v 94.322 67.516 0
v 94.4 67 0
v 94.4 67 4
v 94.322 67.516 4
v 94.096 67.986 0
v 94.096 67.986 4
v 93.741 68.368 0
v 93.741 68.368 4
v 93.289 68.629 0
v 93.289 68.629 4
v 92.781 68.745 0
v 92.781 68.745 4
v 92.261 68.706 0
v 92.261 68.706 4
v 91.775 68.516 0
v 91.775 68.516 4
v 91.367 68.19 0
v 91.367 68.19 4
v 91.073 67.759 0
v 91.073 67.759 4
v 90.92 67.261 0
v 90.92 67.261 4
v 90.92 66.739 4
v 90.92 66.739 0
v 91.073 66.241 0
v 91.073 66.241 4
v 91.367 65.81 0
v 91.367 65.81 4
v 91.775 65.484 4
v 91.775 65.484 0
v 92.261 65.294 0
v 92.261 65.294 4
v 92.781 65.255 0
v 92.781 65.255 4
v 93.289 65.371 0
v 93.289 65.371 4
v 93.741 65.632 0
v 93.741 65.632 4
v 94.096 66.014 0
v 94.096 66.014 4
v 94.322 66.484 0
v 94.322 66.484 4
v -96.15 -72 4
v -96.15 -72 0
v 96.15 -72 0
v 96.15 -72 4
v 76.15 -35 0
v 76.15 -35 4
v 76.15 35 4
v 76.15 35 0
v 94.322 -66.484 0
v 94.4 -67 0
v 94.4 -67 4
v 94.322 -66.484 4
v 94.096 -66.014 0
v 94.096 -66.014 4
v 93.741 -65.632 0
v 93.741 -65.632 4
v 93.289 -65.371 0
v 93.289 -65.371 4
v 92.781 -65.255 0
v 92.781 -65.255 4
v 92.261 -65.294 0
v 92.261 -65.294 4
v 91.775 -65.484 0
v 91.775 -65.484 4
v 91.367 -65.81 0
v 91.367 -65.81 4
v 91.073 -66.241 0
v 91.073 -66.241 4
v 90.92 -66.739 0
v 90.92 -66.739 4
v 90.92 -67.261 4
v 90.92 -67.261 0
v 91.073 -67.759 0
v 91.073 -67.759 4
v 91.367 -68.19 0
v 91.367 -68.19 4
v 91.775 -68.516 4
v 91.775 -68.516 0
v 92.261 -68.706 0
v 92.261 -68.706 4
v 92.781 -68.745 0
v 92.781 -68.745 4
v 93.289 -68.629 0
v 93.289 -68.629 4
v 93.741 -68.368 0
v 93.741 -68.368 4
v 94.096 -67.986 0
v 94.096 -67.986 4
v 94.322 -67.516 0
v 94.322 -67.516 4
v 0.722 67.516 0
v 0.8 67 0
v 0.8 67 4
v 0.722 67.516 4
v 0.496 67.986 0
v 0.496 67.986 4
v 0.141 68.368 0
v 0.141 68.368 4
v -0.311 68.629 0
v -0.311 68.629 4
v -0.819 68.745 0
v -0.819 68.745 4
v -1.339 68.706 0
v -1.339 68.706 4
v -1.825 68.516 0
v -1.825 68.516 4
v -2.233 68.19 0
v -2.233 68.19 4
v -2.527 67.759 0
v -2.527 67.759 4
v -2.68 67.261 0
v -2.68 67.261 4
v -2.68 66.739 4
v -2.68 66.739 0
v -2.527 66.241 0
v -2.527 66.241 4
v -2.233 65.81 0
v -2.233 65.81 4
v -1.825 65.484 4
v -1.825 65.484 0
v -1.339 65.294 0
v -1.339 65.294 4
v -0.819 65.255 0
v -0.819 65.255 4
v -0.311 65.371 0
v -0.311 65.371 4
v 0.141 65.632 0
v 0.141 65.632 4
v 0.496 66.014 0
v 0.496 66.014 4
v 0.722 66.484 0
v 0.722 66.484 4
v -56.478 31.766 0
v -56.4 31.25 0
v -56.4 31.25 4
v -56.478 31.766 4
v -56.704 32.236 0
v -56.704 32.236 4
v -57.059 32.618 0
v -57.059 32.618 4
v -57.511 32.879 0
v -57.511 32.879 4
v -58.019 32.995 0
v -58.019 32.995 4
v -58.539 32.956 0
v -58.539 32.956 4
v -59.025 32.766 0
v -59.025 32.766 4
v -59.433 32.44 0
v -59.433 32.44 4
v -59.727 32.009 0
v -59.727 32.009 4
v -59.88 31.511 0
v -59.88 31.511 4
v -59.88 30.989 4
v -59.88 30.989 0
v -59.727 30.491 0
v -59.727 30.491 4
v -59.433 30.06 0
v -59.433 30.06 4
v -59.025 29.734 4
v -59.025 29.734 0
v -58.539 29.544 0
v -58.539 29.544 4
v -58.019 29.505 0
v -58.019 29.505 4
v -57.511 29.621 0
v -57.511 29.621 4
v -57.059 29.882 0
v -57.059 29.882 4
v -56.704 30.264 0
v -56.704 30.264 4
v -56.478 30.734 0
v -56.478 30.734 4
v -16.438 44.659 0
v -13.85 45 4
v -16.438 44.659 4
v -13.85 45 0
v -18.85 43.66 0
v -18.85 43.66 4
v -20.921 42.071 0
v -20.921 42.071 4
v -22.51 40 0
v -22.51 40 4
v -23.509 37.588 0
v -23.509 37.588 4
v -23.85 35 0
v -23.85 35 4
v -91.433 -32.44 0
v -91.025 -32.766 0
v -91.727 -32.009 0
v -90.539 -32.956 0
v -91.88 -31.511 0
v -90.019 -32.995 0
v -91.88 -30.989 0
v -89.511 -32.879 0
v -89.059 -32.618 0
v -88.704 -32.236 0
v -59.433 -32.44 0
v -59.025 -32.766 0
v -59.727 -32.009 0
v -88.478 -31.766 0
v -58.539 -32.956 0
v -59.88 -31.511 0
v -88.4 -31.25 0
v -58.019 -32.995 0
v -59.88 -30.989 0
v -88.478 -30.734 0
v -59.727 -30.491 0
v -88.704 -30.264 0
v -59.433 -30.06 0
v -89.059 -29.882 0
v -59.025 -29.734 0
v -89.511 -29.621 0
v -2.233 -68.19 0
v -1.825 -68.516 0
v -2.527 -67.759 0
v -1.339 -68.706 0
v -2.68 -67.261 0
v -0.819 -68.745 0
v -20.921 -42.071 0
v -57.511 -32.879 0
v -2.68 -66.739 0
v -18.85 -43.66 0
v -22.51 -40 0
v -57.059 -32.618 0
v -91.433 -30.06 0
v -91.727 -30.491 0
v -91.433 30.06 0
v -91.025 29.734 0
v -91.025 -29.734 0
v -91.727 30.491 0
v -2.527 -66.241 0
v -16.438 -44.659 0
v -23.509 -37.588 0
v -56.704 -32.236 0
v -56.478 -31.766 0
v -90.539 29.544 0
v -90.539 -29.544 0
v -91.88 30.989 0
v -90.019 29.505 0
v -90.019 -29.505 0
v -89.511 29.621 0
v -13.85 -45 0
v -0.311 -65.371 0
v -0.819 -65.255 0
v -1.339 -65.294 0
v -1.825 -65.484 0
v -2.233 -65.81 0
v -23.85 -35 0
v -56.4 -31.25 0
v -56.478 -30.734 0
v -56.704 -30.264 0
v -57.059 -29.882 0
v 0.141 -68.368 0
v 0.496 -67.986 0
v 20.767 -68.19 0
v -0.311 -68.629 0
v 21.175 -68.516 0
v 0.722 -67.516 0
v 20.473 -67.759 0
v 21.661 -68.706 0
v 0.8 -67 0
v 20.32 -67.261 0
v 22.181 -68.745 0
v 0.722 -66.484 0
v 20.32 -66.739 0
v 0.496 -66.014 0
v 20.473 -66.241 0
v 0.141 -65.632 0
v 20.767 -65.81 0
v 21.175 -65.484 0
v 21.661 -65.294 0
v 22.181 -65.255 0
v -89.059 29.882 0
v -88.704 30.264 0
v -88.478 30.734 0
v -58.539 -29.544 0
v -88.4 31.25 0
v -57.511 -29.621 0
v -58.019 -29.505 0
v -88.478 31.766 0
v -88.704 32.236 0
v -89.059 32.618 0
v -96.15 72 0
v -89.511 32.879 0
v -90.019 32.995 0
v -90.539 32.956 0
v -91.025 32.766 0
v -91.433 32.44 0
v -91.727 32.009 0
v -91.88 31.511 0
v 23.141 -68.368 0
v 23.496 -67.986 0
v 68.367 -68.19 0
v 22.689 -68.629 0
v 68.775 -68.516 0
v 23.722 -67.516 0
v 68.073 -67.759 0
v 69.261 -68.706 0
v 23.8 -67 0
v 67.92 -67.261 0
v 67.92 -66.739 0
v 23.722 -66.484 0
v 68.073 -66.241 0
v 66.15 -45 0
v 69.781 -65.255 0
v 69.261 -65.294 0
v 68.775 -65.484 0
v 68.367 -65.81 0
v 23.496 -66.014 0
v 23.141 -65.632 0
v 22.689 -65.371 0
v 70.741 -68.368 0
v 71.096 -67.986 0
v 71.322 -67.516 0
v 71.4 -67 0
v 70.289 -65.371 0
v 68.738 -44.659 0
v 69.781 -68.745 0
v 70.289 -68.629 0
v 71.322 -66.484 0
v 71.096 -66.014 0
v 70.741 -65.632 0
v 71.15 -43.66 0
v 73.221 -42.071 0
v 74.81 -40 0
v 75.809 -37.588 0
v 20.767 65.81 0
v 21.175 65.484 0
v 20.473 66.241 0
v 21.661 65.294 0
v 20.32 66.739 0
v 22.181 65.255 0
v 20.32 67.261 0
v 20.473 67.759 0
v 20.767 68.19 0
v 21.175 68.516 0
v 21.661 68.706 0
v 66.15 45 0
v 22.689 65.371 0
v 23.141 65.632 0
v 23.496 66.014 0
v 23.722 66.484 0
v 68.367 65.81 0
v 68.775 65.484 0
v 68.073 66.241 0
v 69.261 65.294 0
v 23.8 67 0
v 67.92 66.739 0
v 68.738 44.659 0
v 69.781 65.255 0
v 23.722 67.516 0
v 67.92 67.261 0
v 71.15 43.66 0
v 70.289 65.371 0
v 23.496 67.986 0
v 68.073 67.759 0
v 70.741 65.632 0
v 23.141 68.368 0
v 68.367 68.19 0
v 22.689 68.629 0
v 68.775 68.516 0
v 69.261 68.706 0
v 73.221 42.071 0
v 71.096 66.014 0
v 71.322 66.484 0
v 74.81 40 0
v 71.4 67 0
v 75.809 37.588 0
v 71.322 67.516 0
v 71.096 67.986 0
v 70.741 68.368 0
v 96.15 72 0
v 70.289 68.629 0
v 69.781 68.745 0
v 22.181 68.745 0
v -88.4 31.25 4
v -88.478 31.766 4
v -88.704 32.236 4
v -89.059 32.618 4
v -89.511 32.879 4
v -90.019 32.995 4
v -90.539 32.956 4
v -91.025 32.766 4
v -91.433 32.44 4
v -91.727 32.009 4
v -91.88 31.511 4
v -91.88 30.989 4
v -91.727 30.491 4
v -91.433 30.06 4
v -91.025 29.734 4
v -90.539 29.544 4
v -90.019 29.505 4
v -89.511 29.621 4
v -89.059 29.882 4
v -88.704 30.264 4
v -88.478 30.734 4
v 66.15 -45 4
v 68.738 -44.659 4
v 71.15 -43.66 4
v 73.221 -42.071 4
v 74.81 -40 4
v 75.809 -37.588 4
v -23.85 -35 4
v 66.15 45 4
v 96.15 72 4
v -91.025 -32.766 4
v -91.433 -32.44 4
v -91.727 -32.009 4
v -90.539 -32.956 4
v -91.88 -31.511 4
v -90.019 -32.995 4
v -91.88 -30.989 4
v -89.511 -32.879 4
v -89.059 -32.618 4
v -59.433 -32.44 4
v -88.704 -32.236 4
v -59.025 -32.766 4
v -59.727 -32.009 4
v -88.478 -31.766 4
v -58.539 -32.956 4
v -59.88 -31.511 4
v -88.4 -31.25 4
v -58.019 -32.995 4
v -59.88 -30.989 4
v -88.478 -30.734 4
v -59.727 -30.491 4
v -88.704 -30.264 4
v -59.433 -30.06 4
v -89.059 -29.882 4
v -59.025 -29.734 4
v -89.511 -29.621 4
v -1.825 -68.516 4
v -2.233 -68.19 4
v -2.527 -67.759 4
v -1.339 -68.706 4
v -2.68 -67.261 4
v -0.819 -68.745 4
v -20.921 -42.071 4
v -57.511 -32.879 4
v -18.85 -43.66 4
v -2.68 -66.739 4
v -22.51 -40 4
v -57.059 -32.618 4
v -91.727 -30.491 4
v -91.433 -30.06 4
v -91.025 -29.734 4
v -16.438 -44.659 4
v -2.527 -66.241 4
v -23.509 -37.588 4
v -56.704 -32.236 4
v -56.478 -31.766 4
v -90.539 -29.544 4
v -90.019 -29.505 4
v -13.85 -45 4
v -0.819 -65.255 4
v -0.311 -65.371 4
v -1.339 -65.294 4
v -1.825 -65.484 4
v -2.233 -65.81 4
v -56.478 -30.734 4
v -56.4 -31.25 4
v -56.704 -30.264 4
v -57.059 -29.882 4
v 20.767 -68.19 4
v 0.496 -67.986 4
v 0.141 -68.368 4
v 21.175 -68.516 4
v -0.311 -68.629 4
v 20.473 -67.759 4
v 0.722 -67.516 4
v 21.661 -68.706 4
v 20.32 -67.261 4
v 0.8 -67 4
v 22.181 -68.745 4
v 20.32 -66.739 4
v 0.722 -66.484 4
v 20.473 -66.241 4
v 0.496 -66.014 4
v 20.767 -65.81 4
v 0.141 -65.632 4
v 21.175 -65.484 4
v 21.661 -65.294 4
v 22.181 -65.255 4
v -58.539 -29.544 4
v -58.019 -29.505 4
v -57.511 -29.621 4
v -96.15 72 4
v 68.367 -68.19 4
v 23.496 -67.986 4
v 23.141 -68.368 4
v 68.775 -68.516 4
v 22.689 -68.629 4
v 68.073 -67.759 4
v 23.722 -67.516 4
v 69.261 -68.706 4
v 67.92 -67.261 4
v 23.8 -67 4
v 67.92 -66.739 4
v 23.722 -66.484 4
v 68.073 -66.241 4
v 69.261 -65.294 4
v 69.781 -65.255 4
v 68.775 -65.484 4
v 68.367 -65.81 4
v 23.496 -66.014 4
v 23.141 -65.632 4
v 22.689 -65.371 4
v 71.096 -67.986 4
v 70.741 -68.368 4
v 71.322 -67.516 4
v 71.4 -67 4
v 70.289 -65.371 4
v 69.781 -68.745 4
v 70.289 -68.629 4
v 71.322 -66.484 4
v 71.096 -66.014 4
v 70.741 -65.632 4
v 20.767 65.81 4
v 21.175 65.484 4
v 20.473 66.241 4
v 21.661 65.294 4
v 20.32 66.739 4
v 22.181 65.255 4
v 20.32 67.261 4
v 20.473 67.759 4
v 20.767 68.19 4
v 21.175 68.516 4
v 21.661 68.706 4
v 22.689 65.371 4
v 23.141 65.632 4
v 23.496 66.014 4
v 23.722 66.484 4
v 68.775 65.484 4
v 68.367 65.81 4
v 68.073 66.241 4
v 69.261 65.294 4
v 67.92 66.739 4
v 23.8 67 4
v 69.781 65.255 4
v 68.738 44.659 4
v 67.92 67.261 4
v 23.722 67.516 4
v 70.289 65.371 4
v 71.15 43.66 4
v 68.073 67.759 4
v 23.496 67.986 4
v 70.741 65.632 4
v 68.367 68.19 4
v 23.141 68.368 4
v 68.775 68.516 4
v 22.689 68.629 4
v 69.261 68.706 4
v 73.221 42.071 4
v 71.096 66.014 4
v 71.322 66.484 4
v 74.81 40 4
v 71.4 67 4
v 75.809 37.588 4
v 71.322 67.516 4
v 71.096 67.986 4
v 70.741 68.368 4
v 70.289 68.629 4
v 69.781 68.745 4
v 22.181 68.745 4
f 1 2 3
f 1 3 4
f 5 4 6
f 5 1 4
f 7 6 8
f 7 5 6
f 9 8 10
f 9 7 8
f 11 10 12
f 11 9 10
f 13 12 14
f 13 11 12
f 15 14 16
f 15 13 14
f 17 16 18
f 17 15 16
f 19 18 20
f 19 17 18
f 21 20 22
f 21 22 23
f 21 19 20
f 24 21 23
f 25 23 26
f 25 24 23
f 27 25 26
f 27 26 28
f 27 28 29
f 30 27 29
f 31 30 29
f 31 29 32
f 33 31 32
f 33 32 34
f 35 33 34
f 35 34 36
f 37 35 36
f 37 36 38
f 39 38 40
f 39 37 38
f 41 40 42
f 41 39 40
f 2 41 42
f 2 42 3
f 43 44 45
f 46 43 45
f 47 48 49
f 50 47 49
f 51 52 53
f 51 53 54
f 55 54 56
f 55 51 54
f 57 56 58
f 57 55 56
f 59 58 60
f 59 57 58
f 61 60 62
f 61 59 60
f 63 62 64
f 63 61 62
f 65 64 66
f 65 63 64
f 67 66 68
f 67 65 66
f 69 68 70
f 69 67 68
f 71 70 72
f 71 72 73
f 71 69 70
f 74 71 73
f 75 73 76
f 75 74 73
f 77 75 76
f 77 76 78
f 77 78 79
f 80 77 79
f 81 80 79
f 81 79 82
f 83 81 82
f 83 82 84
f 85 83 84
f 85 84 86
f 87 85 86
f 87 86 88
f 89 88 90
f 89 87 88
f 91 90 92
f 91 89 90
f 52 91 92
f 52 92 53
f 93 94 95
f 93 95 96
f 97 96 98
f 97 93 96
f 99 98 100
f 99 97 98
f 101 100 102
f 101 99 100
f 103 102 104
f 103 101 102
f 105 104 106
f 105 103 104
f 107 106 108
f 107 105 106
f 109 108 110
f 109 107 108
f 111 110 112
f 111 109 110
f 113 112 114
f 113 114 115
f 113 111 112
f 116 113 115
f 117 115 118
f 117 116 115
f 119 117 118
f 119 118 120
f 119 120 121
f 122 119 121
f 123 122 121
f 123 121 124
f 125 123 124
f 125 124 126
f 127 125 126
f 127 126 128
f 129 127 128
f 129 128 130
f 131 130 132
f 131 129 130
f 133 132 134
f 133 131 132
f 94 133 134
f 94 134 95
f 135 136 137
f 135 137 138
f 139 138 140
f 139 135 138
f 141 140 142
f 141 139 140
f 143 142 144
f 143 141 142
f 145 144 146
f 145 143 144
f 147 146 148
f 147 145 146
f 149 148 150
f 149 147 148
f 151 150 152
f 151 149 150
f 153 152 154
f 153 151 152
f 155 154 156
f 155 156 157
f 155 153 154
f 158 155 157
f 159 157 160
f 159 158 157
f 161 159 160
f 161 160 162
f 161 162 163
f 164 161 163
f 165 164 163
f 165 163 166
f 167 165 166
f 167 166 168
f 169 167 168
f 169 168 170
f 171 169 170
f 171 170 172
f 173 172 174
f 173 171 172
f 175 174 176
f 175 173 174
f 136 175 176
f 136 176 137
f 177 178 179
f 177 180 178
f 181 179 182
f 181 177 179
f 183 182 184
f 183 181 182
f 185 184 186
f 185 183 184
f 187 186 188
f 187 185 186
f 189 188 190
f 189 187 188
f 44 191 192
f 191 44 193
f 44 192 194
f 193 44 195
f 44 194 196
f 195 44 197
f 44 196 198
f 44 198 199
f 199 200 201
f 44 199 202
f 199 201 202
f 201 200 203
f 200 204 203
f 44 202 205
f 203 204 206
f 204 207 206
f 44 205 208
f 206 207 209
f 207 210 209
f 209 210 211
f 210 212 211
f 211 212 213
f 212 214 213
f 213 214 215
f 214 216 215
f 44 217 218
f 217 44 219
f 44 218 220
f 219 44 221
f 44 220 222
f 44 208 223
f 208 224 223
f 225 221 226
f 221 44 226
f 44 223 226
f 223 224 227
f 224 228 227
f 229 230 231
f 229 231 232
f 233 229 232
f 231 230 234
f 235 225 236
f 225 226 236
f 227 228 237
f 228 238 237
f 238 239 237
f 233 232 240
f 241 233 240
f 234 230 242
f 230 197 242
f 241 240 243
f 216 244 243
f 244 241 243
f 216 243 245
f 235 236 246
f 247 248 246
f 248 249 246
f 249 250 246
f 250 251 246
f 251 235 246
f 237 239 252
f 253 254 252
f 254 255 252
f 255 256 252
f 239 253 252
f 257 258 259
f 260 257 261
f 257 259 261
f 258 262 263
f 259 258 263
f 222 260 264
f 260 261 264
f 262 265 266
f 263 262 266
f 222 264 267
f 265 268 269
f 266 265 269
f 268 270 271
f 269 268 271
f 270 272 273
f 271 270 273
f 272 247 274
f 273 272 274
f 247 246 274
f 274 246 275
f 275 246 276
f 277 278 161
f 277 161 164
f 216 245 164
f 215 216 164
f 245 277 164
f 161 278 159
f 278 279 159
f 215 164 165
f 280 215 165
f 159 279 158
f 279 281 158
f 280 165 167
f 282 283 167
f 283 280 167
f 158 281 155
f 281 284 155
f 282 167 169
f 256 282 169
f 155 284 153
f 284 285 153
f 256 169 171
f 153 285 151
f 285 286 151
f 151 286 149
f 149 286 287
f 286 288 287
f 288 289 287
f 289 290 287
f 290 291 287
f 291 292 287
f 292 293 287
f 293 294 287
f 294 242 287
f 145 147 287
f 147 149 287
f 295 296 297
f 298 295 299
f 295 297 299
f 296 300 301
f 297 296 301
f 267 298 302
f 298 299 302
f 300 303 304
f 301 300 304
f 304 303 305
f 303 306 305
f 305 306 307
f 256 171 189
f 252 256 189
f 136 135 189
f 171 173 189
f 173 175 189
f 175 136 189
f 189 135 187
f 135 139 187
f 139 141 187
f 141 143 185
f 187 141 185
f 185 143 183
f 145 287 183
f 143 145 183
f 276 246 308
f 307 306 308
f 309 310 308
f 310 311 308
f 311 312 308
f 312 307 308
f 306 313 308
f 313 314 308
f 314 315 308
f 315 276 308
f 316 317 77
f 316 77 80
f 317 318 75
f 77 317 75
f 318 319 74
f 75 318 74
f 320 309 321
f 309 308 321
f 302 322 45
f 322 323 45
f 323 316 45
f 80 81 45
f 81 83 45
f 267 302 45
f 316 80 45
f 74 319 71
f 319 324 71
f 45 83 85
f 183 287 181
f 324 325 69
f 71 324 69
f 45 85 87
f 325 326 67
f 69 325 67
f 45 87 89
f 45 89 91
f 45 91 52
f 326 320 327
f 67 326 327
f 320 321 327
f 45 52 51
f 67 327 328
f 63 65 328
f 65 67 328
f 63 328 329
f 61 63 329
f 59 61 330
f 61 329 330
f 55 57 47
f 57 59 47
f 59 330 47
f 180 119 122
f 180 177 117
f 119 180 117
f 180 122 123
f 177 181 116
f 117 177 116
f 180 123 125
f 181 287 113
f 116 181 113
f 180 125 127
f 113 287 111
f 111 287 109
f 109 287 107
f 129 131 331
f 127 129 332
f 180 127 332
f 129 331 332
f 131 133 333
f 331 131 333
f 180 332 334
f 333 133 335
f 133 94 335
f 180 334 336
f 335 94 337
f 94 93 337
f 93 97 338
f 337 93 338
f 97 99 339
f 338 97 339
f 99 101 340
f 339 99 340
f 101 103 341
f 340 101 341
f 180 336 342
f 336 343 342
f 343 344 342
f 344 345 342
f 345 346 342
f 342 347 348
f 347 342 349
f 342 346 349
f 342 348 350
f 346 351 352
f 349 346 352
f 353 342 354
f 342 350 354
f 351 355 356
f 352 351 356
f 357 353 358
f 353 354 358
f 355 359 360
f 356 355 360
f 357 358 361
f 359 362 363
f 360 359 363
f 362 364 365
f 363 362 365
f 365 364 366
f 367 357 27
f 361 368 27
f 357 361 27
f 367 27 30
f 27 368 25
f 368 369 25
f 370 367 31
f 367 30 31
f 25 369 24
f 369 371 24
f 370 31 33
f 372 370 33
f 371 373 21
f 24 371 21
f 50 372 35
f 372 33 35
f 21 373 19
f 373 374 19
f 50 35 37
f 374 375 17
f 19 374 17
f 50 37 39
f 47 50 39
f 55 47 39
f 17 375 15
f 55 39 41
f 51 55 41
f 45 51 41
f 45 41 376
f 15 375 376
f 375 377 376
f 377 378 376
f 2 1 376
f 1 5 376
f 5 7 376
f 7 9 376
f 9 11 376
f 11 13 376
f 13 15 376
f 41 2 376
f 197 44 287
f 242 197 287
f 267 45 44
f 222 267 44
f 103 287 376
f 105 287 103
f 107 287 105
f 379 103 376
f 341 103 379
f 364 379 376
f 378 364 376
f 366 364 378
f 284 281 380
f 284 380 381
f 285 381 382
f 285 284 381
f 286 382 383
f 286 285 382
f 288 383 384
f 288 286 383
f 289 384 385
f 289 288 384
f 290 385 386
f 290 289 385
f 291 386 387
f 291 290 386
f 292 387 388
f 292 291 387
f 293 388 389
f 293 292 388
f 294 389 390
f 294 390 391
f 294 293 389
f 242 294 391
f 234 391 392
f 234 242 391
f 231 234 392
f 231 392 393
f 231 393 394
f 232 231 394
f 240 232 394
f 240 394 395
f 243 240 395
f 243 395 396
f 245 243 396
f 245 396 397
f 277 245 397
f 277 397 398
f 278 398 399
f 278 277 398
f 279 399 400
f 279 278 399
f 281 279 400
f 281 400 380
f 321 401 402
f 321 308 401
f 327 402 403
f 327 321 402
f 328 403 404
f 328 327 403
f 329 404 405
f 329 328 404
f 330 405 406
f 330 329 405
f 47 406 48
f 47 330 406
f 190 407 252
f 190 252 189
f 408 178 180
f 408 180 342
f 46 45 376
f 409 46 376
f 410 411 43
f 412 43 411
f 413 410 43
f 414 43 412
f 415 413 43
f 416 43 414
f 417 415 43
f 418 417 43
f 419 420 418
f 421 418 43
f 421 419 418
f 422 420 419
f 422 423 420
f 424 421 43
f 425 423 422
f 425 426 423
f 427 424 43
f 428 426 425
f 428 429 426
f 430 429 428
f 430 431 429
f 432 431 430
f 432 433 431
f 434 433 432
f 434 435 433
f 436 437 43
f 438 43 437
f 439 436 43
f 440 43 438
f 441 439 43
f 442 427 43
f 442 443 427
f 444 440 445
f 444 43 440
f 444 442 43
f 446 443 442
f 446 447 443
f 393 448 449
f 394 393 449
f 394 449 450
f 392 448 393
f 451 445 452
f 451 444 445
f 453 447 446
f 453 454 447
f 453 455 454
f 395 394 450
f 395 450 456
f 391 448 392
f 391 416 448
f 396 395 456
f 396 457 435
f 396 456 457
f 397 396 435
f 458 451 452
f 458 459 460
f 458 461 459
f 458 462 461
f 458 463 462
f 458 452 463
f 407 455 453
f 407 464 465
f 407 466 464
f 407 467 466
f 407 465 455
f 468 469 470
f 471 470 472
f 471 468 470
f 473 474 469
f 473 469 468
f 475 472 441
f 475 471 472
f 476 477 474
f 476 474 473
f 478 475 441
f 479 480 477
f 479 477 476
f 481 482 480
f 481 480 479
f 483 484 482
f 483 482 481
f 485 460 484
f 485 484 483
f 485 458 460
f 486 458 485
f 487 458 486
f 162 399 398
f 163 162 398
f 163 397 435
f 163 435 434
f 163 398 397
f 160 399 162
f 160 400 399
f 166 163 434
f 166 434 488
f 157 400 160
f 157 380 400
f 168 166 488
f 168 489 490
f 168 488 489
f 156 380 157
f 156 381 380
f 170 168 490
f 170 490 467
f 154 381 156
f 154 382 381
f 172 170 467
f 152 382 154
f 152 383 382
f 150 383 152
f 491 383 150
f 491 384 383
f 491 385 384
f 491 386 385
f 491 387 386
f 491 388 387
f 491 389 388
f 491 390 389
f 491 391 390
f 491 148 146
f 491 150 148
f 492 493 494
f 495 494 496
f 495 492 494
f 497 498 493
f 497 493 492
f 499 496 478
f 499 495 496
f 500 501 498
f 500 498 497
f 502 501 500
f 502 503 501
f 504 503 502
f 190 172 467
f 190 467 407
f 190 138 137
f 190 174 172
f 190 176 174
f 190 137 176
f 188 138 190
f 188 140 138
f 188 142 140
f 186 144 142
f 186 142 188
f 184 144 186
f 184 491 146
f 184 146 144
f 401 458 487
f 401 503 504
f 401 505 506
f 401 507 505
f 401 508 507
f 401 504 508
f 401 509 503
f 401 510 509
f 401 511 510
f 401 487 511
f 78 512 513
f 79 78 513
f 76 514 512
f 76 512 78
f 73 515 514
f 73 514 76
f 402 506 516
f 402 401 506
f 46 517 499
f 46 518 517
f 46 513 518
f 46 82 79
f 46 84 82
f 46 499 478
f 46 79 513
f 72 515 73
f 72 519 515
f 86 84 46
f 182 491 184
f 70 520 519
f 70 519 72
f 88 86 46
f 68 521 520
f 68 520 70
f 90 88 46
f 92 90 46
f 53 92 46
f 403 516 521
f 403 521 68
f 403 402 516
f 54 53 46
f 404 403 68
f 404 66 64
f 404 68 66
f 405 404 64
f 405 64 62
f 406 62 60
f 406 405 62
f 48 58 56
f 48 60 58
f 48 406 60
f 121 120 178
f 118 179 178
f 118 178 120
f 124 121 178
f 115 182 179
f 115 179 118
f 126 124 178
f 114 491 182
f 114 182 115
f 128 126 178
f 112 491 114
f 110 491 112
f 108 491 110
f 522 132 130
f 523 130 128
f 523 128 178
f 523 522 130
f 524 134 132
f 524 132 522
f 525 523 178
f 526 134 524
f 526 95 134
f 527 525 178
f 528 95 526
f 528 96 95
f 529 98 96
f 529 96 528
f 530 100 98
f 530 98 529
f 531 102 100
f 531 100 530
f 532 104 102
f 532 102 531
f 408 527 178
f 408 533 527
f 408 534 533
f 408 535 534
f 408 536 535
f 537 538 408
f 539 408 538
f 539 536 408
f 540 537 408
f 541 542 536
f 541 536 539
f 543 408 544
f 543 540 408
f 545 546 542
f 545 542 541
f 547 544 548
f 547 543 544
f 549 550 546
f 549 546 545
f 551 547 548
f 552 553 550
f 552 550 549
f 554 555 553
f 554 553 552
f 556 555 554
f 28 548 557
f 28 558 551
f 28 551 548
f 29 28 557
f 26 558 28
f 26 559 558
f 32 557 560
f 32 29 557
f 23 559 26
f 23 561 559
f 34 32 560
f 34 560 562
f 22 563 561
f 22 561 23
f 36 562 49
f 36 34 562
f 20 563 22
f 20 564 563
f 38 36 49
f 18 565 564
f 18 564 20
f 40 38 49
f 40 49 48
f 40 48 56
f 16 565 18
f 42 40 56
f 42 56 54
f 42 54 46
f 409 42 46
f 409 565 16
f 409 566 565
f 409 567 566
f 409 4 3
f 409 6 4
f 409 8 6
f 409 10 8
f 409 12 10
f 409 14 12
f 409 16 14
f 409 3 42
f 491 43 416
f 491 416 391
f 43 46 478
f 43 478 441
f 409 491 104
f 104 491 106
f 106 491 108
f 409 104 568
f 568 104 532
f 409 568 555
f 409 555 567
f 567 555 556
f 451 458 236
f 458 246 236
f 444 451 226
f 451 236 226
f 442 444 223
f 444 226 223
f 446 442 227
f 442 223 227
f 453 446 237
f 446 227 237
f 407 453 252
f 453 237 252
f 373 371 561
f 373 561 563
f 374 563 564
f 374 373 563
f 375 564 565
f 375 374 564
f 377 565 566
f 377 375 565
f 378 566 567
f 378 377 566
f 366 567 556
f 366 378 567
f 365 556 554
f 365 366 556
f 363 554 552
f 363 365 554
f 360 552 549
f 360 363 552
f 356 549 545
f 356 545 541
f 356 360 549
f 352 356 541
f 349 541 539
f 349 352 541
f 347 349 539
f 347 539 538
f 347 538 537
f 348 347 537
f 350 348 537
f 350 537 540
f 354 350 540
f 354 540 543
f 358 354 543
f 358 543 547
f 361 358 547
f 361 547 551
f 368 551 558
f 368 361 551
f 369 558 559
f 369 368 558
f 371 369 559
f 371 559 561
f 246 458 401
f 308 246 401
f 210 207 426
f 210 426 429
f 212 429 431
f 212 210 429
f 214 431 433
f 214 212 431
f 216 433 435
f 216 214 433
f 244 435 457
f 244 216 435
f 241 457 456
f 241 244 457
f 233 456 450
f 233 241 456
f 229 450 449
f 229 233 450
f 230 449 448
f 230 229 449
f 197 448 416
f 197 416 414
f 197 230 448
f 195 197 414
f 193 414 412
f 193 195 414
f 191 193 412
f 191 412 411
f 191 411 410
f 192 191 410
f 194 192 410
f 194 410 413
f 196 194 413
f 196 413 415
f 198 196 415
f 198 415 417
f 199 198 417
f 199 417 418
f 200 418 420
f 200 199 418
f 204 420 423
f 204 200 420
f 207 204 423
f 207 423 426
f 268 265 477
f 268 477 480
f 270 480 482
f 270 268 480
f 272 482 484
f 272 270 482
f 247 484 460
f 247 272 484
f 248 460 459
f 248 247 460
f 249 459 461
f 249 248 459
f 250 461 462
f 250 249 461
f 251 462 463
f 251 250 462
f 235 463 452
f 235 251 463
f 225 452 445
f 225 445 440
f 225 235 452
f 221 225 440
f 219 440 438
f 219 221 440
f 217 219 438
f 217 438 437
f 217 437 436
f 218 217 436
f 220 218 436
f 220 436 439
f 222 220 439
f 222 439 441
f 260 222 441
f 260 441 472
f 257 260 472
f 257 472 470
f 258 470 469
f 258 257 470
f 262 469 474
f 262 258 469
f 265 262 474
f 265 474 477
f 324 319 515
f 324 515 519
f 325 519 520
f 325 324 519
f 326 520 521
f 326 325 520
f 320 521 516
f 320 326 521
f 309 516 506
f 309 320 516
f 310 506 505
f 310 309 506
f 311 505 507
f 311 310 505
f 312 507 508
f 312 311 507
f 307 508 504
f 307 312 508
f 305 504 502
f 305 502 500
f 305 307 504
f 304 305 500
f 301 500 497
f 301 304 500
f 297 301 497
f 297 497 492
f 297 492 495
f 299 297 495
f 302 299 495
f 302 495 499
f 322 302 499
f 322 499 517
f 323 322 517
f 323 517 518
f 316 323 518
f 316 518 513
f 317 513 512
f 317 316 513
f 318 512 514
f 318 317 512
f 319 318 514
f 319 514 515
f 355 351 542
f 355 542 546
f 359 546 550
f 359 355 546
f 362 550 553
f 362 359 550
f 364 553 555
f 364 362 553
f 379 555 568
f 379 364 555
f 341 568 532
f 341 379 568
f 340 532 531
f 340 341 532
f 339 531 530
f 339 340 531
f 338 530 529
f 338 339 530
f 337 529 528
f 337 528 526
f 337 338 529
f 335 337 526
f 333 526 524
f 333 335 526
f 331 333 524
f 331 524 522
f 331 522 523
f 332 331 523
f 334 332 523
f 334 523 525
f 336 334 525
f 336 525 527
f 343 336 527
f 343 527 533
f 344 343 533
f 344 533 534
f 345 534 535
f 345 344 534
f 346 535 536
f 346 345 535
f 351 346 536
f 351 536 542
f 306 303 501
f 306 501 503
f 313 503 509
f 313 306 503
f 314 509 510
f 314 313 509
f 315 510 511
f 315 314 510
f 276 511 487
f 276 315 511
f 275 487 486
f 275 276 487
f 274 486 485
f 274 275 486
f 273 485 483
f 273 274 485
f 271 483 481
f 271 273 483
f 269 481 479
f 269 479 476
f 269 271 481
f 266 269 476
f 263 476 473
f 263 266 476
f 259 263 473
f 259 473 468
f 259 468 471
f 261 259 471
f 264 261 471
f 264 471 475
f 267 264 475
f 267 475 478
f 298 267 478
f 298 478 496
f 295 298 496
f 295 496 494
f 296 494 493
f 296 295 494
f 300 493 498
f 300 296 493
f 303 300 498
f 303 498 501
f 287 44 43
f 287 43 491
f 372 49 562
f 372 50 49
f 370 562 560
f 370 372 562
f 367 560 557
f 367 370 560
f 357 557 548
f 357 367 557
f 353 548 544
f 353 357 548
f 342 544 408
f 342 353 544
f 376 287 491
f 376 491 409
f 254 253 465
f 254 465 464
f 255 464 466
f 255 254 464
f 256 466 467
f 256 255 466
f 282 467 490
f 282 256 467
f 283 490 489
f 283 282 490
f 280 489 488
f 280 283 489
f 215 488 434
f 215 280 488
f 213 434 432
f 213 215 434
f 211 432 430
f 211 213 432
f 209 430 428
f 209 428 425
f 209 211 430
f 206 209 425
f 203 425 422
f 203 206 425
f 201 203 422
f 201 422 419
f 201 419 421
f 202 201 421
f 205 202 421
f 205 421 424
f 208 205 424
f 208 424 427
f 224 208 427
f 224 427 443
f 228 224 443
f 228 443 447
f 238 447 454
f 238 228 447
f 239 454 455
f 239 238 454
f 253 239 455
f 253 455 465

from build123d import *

# Parameters (mm, degrees)
SKETCH_1_W          = 192.3
SKETCH_1_H          = 144
SKETCH_1_R          = 1.75
EXTRUDE_1_DEPTH     = 4
SKETCH_2_W          = 100
SKETCH_2_H          = 90
CUT_EXTRUDE_1_DEPTH = 10
FILLET_1_R          = 10


with BuildPart() as part:
    # ｽｹｯﾁ1 → ﾎﾞｽ - 押し出し1 (new body)
    with BuildSketch(Plane.XY):
        Rectangle(SKETCH_1_W, SKETCH_1_H)
        with Locations((92.65, 67)):
            Circle(SKETCH_1_R, mode=Mode.SUBTRACT)
        with Locations((69.65, 67)):
            Circle(SKETCH_1_R, mode=Mode.SUBTRACT)
        with Locations((22.05, 67)):
            Circle(SKETCH_1_R, mode=Mode.SUBTRACT)
        with Locations((-0.95, 67)):
            Circle(SKETCH_1_R, mode=Mode.SUBTRACT)
        with Locations((-0.95, -67)):
            Circle(SKETCH_1_R, mode=Mode.SUBTRACT)
        with Locations((22.05, -67)):
            Circle(SKETCH_1_R, mode=Mode.SUBTRACT)
        with Locations((69.65, -67)):
            Circle(SKETCH_1_R, mode=Mode.SUBTRACT)
        with Locations((92.65, -67)):
            Circle(SKETCH_1_R, mode=Mode.SUBTRACT)
        with Locations((-90.15, 31.25)):
            Circle(SKETCH_1_R, mode=Mode.SUBTRACT)
        with Locations((-90.15, -31.25)):
            Circle(SKETCH_1_R, mode=Mode.SUBTRACT)
        with Locations((-58.15, 31.25)):
            Circle(SKETCH_1_R, mode=Mode.SUBTRACT)
        with Locations((-58.15, -31.25)):
            Circle(SKETCH_1_R, mode=Mode.SUBTRACT)
    extrude(amount=EXTRUDE_1_DEPTH)

    # ｽｹｯﾁ2 → ｶｯﾄ - 押し出し1 (cut)
    with BuildSketch(Plane.XY.offset(4)):
        with Locations((26.15, 0)):
            Rectangle(SKETCH_2_W, SKETCH_2_H)
    extrude(amount=-CUT_EXTRUDE_1_DEPTH, mode=Mode.SUBTRACT)

    # ﾌｨﾚｯﾄ1
    fillet_1_edges = [part.edges().sort_by_distance(p)[0] for p in [
        (-23.85, -45, 2),
        (-23.85, 45, 2),
        (76.15, 45, 2),
        (76.15, -45, 2),
    ]]
    fillet(fillet_1_edges, radius=FILLET_1_R)


solid = part.part
